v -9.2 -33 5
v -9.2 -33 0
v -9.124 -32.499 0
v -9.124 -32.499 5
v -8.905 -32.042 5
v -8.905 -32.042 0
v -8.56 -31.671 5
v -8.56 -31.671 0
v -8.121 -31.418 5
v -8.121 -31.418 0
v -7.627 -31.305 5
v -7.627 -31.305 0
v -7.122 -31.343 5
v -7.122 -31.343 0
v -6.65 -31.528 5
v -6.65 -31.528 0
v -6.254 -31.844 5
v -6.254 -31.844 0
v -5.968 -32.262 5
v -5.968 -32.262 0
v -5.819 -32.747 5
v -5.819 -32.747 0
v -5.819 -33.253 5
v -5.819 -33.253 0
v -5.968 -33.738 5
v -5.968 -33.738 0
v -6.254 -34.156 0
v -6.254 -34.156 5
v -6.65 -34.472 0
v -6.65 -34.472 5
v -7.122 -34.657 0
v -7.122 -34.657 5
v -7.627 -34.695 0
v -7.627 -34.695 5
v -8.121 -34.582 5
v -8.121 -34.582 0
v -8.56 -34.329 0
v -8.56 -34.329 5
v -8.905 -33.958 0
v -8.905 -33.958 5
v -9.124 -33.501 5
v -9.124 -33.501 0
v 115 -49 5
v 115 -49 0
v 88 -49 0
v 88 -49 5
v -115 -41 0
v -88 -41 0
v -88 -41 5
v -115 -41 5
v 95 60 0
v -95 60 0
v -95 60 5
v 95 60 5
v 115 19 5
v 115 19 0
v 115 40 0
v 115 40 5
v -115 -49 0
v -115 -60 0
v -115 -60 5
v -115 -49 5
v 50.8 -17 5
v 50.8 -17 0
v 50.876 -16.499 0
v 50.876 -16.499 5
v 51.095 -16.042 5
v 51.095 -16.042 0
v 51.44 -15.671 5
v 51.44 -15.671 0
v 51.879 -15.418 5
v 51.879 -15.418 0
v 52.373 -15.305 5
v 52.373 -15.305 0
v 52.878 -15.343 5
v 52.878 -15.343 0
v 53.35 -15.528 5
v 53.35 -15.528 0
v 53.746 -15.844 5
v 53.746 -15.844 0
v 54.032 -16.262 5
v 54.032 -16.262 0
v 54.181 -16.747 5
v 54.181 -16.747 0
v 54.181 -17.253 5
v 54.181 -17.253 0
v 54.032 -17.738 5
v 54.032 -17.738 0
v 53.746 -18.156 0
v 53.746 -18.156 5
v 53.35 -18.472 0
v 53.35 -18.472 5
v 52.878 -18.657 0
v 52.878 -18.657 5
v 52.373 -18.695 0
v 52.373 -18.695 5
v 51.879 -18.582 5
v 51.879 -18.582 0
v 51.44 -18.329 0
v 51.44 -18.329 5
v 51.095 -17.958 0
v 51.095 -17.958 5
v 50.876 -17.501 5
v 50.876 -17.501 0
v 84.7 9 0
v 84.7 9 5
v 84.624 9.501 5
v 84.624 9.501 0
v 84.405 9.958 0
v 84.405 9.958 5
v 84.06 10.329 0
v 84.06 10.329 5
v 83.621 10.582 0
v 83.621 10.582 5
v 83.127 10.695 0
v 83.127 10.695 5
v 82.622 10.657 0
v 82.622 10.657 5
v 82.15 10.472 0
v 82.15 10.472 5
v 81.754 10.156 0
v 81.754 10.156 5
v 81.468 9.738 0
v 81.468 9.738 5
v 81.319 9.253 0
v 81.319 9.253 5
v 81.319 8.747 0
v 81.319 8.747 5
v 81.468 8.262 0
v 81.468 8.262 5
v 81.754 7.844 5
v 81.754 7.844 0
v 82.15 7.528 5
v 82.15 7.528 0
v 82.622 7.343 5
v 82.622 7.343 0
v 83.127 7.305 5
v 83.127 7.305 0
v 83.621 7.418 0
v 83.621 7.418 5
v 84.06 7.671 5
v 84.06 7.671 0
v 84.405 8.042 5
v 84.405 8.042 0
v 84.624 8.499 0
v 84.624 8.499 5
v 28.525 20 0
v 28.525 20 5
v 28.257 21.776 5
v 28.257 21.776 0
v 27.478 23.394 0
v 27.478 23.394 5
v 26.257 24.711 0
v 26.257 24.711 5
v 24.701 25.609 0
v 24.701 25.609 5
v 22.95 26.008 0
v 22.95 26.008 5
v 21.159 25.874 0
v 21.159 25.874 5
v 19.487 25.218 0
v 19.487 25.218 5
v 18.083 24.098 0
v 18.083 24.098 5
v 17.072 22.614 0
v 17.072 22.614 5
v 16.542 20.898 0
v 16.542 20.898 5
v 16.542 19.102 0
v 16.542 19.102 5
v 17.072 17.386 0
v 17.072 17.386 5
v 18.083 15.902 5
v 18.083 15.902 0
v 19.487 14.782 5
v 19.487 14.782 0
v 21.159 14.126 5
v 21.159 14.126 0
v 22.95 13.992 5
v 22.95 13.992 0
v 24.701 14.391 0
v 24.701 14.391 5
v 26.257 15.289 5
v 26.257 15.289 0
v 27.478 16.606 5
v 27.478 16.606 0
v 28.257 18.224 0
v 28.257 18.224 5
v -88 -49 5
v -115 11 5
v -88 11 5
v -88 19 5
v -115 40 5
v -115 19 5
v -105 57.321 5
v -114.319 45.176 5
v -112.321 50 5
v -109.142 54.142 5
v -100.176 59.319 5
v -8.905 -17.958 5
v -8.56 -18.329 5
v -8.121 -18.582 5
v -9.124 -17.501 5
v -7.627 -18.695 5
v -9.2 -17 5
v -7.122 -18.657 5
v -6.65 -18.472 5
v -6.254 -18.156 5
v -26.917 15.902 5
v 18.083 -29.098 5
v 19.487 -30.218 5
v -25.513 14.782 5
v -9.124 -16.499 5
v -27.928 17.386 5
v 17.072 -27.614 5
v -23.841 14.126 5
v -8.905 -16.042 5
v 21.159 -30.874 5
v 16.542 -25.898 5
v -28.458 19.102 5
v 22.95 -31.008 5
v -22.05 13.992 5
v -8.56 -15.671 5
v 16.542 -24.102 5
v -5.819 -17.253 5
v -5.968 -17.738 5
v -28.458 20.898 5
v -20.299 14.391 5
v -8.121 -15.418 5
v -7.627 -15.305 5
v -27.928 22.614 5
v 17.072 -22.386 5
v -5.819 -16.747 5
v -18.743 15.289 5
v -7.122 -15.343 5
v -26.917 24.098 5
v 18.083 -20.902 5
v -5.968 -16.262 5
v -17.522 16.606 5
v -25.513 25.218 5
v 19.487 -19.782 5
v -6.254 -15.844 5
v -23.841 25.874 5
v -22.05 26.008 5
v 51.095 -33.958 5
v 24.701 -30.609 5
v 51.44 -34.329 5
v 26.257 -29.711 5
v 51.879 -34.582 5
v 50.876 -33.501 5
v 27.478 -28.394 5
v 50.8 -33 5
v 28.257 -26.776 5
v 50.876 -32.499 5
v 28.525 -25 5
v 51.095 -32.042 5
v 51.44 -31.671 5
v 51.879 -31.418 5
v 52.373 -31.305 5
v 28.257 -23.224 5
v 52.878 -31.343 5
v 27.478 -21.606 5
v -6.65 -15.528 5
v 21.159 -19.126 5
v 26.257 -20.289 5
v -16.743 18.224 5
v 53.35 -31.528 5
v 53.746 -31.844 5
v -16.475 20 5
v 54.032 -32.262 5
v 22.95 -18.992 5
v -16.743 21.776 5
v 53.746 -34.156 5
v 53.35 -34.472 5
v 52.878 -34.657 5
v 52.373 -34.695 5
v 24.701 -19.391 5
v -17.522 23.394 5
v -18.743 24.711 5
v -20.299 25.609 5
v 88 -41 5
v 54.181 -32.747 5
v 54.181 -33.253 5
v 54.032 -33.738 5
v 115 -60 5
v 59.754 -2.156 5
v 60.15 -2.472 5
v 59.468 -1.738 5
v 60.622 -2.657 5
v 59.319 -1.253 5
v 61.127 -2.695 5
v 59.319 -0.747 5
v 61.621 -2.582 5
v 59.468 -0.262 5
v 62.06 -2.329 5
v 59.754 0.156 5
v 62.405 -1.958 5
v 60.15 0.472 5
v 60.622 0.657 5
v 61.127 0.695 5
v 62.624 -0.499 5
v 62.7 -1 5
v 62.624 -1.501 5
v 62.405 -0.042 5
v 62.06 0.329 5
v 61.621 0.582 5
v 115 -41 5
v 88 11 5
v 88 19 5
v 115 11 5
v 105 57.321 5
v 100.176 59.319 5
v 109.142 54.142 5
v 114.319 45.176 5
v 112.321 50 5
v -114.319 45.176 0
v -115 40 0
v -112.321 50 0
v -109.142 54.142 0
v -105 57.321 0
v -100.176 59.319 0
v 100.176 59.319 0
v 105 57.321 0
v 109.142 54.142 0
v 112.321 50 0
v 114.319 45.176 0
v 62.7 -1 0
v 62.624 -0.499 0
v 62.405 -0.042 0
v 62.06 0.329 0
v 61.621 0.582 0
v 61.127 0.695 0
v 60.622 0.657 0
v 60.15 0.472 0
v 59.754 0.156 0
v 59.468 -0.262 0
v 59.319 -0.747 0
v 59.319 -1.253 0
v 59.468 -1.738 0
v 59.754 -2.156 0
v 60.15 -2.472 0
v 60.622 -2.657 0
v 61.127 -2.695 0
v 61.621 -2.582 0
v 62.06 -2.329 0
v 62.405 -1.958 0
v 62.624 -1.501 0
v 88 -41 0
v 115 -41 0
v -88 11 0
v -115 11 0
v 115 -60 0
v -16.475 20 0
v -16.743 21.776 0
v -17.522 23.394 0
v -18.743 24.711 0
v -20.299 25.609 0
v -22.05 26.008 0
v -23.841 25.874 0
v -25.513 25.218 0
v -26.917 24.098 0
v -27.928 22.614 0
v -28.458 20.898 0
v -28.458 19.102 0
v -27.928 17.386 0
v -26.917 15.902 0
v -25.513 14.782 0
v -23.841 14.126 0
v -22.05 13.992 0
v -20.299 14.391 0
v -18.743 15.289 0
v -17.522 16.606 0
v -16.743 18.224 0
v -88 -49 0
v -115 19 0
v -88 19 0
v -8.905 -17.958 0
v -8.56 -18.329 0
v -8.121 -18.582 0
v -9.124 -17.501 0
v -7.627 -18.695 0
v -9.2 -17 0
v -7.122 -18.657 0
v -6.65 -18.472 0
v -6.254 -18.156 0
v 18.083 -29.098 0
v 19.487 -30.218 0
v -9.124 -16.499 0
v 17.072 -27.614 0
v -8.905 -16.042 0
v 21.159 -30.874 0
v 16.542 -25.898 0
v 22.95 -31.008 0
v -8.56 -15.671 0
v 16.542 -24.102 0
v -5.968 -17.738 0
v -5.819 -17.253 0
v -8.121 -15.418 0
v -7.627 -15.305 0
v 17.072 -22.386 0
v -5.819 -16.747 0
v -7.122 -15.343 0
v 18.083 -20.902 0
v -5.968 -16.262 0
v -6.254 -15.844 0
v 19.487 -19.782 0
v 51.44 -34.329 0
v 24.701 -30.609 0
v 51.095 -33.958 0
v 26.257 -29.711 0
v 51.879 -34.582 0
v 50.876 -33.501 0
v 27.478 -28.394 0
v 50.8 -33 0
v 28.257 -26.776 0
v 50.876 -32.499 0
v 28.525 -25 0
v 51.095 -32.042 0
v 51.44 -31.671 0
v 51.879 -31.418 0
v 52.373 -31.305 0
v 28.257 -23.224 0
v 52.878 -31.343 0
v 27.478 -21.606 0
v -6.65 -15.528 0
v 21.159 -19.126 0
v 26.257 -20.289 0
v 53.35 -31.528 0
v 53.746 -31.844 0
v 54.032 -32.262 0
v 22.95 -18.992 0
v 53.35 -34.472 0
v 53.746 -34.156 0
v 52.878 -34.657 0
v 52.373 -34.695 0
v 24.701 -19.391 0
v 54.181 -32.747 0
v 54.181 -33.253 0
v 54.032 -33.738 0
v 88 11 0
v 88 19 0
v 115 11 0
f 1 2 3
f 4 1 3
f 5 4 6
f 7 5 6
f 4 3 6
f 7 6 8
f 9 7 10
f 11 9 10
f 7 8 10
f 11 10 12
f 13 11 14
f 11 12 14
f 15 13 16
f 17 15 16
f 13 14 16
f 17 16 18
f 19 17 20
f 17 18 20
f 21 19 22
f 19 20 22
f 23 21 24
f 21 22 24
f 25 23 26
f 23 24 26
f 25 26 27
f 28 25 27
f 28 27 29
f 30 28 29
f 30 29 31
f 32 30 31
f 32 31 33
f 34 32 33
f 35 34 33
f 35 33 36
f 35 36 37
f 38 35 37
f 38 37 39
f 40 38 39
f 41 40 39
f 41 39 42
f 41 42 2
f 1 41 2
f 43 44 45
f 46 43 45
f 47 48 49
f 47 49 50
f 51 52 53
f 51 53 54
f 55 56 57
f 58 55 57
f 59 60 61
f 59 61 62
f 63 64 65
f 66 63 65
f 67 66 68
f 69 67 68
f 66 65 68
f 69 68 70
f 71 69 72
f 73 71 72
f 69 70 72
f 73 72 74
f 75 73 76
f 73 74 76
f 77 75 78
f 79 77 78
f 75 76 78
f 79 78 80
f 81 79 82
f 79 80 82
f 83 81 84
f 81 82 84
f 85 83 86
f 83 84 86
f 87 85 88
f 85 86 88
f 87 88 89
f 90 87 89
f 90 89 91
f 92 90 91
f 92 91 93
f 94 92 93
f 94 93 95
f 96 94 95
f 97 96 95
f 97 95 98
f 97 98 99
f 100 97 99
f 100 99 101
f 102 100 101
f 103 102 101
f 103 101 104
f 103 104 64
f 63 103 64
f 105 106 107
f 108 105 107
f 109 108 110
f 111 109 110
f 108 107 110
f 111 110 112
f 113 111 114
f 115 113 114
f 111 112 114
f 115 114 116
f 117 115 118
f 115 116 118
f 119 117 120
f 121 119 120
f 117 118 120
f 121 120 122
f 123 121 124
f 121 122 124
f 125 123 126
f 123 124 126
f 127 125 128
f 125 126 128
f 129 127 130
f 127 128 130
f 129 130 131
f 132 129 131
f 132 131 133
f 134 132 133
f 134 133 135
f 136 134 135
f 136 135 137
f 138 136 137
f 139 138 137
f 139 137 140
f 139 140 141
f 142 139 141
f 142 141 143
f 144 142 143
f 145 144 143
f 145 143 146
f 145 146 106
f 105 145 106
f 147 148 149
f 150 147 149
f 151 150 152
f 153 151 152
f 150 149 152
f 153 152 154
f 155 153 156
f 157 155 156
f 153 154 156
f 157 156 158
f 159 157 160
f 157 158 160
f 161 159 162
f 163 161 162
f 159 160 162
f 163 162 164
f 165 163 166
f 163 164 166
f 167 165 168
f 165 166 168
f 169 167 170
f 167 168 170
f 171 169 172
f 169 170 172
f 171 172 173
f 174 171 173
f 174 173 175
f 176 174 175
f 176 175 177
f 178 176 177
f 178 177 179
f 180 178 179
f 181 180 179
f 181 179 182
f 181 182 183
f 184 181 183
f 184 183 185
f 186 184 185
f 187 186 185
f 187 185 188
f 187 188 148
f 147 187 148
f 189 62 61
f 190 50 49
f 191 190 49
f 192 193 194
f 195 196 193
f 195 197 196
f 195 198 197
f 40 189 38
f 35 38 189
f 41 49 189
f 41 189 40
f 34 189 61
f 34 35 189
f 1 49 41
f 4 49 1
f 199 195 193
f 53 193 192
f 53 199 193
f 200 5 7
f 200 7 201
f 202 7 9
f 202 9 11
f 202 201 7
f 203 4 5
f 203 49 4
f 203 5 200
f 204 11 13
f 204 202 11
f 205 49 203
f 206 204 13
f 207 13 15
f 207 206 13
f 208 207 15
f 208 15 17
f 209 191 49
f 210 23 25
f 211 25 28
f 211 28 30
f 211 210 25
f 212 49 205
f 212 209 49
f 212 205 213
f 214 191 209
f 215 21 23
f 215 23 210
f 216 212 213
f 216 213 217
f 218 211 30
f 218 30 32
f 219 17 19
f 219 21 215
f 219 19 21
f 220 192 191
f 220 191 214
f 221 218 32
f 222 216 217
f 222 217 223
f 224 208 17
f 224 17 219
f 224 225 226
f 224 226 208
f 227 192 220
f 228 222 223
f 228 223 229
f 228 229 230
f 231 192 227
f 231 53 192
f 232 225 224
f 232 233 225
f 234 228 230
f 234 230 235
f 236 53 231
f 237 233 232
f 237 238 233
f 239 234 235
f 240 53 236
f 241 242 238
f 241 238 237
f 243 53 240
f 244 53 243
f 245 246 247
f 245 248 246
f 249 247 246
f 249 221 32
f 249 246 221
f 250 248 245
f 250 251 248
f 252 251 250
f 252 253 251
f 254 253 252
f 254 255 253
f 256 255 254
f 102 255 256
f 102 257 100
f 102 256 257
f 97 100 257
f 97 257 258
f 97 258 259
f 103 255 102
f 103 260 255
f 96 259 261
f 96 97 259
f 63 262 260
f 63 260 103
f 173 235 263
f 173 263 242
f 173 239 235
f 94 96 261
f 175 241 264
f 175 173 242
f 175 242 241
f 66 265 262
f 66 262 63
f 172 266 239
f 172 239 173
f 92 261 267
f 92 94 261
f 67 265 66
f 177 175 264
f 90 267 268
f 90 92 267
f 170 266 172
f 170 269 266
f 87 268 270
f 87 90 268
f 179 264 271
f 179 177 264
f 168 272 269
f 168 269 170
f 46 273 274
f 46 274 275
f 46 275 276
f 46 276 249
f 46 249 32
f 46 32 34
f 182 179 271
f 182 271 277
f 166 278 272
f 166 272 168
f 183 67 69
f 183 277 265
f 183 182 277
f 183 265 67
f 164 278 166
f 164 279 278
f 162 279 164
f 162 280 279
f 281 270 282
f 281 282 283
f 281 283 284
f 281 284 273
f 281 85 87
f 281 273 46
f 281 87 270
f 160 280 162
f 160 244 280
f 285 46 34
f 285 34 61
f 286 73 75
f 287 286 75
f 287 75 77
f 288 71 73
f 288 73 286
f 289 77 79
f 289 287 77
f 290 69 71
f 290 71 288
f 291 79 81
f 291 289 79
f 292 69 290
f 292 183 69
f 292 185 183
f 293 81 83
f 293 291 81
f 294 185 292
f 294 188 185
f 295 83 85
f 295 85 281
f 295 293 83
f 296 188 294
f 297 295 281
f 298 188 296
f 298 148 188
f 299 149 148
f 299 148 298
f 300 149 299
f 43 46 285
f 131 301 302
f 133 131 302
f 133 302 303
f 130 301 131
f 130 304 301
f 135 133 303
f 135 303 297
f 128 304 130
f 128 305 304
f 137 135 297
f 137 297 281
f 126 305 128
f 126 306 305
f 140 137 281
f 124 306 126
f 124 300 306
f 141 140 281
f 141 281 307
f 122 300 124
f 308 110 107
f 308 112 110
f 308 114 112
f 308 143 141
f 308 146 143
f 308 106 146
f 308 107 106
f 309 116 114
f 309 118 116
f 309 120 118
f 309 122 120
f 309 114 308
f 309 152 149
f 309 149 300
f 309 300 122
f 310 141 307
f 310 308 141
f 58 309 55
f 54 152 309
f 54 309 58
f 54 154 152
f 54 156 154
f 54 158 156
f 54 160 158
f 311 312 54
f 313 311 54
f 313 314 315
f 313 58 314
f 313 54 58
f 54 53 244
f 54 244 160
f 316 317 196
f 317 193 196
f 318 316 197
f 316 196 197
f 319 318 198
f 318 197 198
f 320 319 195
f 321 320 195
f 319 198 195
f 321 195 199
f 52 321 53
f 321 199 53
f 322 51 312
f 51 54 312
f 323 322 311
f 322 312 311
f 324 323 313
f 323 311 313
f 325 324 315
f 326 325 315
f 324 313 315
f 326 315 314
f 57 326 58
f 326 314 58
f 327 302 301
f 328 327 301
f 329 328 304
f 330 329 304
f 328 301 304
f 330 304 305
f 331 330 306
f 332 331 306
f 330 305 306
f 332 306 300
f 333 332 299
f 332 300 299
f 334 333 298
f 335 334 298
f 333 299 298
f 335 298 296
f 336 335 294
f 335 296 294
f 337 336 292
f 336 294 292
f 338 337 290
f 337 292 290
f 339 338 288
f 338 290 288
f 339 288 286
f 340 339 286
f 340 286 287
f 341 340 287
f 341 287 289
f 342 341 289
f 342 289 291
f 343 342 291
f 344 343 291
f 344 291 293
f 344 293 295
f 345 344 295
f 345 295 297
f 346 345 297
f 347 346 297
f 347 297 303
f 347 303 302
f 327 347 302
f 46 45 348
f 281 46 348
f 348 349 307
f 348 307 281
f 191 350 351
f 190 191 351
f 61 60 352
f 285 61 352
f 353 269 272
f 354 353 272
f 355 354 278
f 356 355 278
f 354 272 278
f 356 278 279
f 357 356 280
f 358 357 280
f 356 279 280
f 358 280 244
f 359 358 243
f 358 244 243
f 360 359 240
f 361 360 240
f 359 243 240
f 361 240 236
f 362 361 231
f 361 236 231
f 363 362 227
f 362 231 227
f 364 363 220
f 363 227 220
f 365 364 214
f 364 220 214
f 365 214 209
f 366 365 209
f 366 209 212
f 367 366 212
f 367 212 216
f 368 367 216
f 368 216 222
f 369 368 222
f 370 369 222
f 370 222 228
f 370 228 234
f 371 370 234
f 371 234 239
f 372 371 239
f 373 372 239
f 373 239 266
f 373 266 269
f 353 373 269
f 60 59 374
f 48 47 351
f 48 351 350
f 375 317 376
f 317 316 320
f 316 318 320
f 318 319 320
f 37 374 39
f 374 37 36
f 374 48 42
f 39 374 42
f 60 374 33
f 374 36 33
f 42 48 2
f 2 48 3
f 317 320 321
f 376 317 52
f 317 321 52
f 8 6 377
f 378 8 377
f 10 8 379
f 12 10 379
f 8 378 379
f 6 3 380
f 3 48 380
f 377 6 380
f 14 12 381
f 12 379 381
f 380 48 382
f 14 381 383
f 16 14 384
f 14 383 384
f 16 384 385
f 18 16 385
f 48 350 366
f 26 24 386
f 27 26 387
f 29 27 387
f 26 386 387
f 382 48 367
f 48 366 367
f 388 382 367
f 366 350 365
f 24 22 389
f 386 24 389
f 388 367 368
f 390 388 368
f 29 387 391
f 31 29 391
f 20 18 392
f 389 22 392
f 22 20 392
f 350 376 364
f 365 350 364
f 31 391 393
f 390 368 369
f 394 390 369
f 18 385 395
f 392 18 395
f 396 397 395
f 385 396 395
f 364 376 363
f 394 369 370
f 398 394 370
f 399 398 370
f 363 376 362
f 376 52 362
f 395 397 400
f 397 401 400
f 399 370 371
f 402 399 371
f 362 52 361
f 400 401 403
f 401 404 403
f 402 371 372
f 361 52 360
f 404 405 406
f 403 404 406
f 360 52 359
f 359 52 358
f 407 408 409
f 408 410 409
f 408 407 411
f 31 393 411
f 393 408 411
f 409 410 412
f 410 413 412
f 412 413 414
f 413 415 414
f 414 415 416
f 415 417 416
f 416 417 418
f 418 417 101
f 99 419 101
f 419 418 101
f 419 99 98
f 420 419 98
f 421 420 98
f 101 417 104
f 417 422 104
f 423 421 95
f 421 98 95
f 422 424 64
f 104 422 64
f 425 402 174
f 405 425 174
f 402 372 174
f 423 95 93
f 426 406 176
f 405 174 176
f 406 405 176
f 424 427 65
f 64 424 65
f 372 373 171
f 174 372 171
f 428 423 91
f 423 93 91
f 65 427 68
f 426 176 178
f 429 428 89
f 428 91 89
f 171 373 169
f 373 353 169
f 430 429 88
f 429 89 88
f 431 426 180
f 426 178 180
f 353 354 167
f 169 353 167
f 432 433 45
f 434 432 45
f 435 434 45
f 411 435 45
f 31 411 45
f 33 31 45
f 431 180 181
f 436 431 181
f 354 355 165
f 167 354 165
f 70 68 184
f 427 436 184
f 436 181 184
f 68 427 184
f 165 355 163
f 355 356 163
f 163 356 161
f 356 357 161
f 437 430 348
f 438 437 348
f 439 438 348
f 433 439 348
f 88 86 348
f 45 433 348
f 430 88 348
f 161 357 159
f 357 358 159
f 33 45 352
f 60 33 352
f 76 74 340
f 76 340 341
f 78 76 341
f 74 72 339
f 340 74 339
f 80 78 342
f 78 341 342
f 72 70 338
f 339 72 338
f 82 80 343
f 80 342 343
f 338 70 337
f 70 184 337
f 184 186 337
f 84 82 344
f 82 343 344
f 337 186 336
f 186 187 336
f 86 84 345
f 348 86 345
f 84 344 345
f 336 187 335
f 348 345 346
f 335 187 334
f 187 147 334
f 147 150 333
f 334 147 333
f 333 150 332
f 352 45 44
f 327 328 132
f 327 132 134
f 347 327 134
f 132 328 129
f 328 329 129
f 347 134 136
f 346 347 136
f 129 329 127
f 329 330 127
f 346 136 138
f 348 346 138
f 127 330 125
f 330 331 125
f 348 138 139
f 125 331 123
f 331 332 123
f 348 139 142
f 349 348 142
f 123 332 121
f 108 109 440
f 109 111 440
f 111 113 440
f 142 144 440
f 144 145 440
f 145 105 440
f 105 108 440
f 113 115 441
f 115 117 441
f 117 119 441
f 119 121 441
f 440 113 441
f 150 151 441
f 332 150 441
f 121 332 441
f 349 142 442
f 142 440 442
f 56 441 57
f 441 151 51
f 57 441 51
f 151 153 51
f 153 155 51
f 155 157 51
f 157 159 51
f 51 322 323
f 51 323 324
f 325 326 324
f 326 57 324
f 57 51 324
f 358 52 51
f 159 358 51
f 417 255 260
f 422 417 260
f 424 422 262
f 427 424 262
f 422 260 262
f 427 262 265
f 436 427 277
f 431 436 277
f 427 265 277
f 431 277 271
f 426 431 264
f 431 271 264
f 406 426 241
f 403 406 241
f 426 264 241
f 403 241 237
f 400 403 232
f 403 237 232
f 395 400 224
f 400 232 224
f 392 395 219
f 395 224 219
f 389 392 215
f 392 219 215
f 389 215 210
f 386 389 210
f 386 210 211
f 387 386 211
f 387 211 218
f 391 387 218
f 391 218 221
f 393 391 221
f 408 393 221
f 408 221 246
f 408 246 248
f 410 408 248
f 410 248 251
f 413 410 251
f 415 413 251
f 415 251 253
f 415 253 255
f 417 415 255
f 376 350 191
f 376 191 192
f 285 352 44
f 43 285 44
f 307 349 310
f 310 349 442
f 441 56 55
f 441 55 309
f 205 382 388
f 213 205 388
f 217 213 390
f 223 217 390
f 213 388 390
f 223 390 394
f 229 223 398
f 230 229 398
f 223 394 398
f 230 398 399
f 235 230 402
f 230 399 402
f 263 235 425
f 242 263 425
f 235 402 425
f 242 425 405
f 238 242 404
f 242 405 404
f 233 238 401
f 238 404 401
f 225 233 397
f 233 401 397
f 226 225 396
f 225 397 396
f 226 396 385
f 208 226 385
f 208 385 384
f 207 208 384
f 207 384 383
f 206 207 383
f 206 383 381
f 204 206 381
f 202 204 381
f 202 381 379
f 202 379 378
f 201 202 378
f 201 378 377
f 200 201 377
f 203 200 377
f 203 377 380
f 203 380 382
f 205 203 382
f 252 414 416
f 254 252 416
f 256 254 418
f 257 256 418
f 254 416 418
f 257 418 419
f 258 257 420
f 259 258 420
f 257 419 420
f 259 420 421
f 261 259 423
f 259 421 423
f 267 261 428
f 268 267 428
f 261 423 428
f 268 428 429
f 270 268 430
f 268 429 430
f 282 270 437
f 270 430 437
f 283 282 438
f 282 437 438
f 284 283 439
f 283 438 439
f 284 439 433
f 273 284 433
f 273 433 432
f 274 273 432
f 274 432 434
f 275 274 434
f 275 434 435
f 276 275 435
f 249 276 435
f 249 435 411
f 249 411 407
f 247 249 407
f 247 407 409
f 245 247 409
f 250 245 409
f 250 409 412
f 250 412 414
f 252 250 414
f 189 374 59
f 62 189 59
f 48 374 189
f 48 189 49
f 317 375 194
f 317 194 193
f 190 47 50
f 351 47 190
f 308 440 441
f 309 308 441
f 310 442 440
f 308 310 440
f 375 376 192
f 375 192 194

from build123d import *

# Parameters (mm, degrees)
SKETCH1_W            = 230
SKETCH1_H            = 120
BOSS_EXTRUDE1_DEPTH  = 5
CUT_EXTRUDE1_REACH   = 131.808
SKETCH2_W            = 27
SKETCH2_H            = 8.000000001
CUT_EXTRUDE2_REACH   = 131.808
SKETCH3_R            = 6.025
M3_CLEARANCE_HOLE1_D = 3.4
FILLET1_R            = 20
CUT_EXTRUDE3_REACH   = 131.808
SKETCH7_R            = 1.7


with BuildPart() as part:
    # Sketch1 → Boss-Extrude1 (new body)
    with BuildSketch(Plane.XY):
        Rectangle(SKETCH1_W, SKETCH1_H)
    extrude(amount=BOSS_EXTRUDE1_DEPTH)

    # Sketch2 → Cut-Extrude1 (cut, up to next)
    with BuildSketch(Plane(origin=(0, 0, 0), x_dir=(-1, 0, 0), z_dir=(0, 0, -1)), mode=Mode.PRIVATE) as cut_extrude1_sk1:
        with Locations((101.5, 15.000000001)):
            Rectangle(SKETCH2_W, SKETCH2_H)
    cut_extrude1_tool1 = extrude(cut_extrude1_sk1.sketch, amount=-CUT_EXTRUDE1_REACH, mode=Mode.PRIVATE) & part.part
    # Sketch2 → Cut-Extrude1 (cut, up to next)
    with BuildSketch(Plane(origin=(0, 0, 0), x_dir=(-1, 0, 0), z_dir=(0, 0, -1)), mode=Mode.PRIVATE) as cut_extrude1_sk2:
        with Locations((101.5, -45.000000001)):
            Rectangle(SKETCH2_W, SKETCH2_H)
    cut_extrude1_tool2 = extrude(cut_extrude1_sk2.sketch, amount=-CUT_EXTRUDE1_REACH, mode=Mode.PRIVATE) & part.part
    # Sketch2 → Cut-Extrude1 (cut, up to next)
    with BuildSketch(Plane(origin=(0, 0, 0), x_dir=(-1, 0, 0), z_dir=(0, 0, -1)), mode=Mode.PRIVATE) as cut_extrude1_sk3:
        with Locations((-101.5, -45.000000001)):
            Rectangle(SKETCH2_W, SKETCH2_H)
    cut_extrude1_tool3 = extrude(cut_extrude1_sk3.sketch, amount=-CUT_EXTRUDE1_REACH, mode=Mode.PRIVATE) & part.part
    # Sketch2 → Cut-Extrude1 (cut, up to next)
    with BuildSketch(Plane(origin=(0, 0, 0), x_dir=(-1, 0, 0), z_dir=(0, 0, -1)), mode=Mode.PRIVATE) as cut_extrude1_sk4:
        with Locations((-101.5, 15.000000001)):
            Rectangle(SKETCH2_W, SKETCH2_H)
    cut_extrude1_tool4 = extrude(cut_extrude1_sk4.sketch, amount=-CUT_EXTRUDE1_REACH, mode=Mode.PRIVATE) & part.part
    add(cut_extrude1_tool1.solids().sort_by_distance((-101.5, 15, 0))[0], mode=Mode.SUBTRACT)
    add(cut_extrude1_tool2.solids().sort_by_distance((-101.5, -45, 0))[0], mode=Mode.SUBTRACT)
    add(cut_extrude1_tool3.solids().sort_by_distance((101.5, -45, 0))[0], mode=Mode.SUBTRACT)
    add(cut_extrude1_tool4.solids().sort_by_distance((101.5, 15, 0))[0], mode=Mode.SUBTRACT)

    # Sketch3 → Cut-Extrude2 (cut, up to next)
    with BuildSketch(Plane.XY.offset(5), mode=Mode.PRIVATE) as cut_extrude2_sk1:
        with Locations((22.5, 20)):
            Circle(SKETCH3_R)
    cut_extrude2_tool1 = extrude(cut_extrude2_sk1.sketch, amount=-CUT_EXTRUDE2_REACH, mode=Mode.PRIVATE) & part.part
    # Sketch3 → Cut-Extrude2 (cut, up to next)
    with BuildSketch(Plane.XY.offset(5), mode=Mode.PRIVATE) as cut_extrude2_sk2:
        with Locations((-22.5, 20)):
            Circle(SKETCH3_R)
    cut_extrude2_tool2 = extrude(cut_extrude2_sk2.sketch, amount=-CUT_EXTRUDE2_REACH, mode=Mode.PRIVATE) & part.part
    # Sketch3 → Cut-Extrude2 (cut, up to next)
    with BuildSketch(Plane.XY.offset(5), mode=Mode.PRIVATE) as cut_extrude2_sk3:
        with Locations((22.5, -25)):
            Circle(SKETCH3_R)
    cut_extrude2_tool3 = extrude(cut_extrude2_sk3.sketch, amount=-CUT_EXTRUDE2_REACH, mode=Mode.PRIVATE) & part.part
    add(cut_extrude2_tool1.solids().sort_by_distance((22.5, 20, 5))[0], mode=Mode.SUBTRACT)
    add(cut_extrude2_tool2.solids().sort_by_distance((-22.5, 20, 5))[0], mode=Mode.SUBTRACT)
    add(cut_extrude2_tool3.solids().sort_by_distance((22.5, -25, 5))[0], mode=Mode.SUBTRACT)

    # M3 Clearance Hole1 (through all)
    with Locations(Plane(origin=(-7.5, -17, 5), x_dir=(1, 0, 0), z_dir=(0, 0, 1))):
        with Locations((0, 0), (60, 0), (60, -16), (0, -16)):
            Hole(M3_CLEARANCE_HOLE1_D / 2)

    # Fillet1
    fillet1_edges = [part.edges().sort_by_distance(p)[0] for p in [
        (-115, 60, 2.5),
        (115, 60, 2.5),
    ]]
    fillet(fillet1_edges, radius=FILLET1_R)

    # Sketch7 → Cut-Extrude3 (cut, up to next)
    with BuildSketch(Plane.XY.offset(5), mode=Mode.PRIVATE) as cut_extrude3_sk1:
        with Locations((61, -1)):
            Circle(SKETCH7_R)
    cut_extrude3_tool1 = extrude(cut_extrude3_sk1.sketch, amount=-CUT_EXTRUDE3_REACH, mode=Mode.PRIVATE) & part.part
    # Sketch7 → Cut-Extrude3 (cut, up to next)
    with BuildSketch(Plane.XY.offset(5), mode=Mode.PRIVATE) as cut_extrude3_sk2:
        with Locations((83, 9)):
            Circle(SKETCH7_R)
    cut_extrude3_tool2 = extrude(cut_extrude3_sk2.sketch, amount=-CUT_EXTRUDE3_REACH, mode=Mode.PRIVATE) & part.part
    add(cut_extrude3_tool1.solids().sort_by_distance((61, -1, 5))[0], mode=Mode.SUBTRACT)
    add(cut_extrude3_tool2.solids().sort_by_distance((83, 9, 5))[0], mode=Mode.SUBTRACT)


solid = part.part
